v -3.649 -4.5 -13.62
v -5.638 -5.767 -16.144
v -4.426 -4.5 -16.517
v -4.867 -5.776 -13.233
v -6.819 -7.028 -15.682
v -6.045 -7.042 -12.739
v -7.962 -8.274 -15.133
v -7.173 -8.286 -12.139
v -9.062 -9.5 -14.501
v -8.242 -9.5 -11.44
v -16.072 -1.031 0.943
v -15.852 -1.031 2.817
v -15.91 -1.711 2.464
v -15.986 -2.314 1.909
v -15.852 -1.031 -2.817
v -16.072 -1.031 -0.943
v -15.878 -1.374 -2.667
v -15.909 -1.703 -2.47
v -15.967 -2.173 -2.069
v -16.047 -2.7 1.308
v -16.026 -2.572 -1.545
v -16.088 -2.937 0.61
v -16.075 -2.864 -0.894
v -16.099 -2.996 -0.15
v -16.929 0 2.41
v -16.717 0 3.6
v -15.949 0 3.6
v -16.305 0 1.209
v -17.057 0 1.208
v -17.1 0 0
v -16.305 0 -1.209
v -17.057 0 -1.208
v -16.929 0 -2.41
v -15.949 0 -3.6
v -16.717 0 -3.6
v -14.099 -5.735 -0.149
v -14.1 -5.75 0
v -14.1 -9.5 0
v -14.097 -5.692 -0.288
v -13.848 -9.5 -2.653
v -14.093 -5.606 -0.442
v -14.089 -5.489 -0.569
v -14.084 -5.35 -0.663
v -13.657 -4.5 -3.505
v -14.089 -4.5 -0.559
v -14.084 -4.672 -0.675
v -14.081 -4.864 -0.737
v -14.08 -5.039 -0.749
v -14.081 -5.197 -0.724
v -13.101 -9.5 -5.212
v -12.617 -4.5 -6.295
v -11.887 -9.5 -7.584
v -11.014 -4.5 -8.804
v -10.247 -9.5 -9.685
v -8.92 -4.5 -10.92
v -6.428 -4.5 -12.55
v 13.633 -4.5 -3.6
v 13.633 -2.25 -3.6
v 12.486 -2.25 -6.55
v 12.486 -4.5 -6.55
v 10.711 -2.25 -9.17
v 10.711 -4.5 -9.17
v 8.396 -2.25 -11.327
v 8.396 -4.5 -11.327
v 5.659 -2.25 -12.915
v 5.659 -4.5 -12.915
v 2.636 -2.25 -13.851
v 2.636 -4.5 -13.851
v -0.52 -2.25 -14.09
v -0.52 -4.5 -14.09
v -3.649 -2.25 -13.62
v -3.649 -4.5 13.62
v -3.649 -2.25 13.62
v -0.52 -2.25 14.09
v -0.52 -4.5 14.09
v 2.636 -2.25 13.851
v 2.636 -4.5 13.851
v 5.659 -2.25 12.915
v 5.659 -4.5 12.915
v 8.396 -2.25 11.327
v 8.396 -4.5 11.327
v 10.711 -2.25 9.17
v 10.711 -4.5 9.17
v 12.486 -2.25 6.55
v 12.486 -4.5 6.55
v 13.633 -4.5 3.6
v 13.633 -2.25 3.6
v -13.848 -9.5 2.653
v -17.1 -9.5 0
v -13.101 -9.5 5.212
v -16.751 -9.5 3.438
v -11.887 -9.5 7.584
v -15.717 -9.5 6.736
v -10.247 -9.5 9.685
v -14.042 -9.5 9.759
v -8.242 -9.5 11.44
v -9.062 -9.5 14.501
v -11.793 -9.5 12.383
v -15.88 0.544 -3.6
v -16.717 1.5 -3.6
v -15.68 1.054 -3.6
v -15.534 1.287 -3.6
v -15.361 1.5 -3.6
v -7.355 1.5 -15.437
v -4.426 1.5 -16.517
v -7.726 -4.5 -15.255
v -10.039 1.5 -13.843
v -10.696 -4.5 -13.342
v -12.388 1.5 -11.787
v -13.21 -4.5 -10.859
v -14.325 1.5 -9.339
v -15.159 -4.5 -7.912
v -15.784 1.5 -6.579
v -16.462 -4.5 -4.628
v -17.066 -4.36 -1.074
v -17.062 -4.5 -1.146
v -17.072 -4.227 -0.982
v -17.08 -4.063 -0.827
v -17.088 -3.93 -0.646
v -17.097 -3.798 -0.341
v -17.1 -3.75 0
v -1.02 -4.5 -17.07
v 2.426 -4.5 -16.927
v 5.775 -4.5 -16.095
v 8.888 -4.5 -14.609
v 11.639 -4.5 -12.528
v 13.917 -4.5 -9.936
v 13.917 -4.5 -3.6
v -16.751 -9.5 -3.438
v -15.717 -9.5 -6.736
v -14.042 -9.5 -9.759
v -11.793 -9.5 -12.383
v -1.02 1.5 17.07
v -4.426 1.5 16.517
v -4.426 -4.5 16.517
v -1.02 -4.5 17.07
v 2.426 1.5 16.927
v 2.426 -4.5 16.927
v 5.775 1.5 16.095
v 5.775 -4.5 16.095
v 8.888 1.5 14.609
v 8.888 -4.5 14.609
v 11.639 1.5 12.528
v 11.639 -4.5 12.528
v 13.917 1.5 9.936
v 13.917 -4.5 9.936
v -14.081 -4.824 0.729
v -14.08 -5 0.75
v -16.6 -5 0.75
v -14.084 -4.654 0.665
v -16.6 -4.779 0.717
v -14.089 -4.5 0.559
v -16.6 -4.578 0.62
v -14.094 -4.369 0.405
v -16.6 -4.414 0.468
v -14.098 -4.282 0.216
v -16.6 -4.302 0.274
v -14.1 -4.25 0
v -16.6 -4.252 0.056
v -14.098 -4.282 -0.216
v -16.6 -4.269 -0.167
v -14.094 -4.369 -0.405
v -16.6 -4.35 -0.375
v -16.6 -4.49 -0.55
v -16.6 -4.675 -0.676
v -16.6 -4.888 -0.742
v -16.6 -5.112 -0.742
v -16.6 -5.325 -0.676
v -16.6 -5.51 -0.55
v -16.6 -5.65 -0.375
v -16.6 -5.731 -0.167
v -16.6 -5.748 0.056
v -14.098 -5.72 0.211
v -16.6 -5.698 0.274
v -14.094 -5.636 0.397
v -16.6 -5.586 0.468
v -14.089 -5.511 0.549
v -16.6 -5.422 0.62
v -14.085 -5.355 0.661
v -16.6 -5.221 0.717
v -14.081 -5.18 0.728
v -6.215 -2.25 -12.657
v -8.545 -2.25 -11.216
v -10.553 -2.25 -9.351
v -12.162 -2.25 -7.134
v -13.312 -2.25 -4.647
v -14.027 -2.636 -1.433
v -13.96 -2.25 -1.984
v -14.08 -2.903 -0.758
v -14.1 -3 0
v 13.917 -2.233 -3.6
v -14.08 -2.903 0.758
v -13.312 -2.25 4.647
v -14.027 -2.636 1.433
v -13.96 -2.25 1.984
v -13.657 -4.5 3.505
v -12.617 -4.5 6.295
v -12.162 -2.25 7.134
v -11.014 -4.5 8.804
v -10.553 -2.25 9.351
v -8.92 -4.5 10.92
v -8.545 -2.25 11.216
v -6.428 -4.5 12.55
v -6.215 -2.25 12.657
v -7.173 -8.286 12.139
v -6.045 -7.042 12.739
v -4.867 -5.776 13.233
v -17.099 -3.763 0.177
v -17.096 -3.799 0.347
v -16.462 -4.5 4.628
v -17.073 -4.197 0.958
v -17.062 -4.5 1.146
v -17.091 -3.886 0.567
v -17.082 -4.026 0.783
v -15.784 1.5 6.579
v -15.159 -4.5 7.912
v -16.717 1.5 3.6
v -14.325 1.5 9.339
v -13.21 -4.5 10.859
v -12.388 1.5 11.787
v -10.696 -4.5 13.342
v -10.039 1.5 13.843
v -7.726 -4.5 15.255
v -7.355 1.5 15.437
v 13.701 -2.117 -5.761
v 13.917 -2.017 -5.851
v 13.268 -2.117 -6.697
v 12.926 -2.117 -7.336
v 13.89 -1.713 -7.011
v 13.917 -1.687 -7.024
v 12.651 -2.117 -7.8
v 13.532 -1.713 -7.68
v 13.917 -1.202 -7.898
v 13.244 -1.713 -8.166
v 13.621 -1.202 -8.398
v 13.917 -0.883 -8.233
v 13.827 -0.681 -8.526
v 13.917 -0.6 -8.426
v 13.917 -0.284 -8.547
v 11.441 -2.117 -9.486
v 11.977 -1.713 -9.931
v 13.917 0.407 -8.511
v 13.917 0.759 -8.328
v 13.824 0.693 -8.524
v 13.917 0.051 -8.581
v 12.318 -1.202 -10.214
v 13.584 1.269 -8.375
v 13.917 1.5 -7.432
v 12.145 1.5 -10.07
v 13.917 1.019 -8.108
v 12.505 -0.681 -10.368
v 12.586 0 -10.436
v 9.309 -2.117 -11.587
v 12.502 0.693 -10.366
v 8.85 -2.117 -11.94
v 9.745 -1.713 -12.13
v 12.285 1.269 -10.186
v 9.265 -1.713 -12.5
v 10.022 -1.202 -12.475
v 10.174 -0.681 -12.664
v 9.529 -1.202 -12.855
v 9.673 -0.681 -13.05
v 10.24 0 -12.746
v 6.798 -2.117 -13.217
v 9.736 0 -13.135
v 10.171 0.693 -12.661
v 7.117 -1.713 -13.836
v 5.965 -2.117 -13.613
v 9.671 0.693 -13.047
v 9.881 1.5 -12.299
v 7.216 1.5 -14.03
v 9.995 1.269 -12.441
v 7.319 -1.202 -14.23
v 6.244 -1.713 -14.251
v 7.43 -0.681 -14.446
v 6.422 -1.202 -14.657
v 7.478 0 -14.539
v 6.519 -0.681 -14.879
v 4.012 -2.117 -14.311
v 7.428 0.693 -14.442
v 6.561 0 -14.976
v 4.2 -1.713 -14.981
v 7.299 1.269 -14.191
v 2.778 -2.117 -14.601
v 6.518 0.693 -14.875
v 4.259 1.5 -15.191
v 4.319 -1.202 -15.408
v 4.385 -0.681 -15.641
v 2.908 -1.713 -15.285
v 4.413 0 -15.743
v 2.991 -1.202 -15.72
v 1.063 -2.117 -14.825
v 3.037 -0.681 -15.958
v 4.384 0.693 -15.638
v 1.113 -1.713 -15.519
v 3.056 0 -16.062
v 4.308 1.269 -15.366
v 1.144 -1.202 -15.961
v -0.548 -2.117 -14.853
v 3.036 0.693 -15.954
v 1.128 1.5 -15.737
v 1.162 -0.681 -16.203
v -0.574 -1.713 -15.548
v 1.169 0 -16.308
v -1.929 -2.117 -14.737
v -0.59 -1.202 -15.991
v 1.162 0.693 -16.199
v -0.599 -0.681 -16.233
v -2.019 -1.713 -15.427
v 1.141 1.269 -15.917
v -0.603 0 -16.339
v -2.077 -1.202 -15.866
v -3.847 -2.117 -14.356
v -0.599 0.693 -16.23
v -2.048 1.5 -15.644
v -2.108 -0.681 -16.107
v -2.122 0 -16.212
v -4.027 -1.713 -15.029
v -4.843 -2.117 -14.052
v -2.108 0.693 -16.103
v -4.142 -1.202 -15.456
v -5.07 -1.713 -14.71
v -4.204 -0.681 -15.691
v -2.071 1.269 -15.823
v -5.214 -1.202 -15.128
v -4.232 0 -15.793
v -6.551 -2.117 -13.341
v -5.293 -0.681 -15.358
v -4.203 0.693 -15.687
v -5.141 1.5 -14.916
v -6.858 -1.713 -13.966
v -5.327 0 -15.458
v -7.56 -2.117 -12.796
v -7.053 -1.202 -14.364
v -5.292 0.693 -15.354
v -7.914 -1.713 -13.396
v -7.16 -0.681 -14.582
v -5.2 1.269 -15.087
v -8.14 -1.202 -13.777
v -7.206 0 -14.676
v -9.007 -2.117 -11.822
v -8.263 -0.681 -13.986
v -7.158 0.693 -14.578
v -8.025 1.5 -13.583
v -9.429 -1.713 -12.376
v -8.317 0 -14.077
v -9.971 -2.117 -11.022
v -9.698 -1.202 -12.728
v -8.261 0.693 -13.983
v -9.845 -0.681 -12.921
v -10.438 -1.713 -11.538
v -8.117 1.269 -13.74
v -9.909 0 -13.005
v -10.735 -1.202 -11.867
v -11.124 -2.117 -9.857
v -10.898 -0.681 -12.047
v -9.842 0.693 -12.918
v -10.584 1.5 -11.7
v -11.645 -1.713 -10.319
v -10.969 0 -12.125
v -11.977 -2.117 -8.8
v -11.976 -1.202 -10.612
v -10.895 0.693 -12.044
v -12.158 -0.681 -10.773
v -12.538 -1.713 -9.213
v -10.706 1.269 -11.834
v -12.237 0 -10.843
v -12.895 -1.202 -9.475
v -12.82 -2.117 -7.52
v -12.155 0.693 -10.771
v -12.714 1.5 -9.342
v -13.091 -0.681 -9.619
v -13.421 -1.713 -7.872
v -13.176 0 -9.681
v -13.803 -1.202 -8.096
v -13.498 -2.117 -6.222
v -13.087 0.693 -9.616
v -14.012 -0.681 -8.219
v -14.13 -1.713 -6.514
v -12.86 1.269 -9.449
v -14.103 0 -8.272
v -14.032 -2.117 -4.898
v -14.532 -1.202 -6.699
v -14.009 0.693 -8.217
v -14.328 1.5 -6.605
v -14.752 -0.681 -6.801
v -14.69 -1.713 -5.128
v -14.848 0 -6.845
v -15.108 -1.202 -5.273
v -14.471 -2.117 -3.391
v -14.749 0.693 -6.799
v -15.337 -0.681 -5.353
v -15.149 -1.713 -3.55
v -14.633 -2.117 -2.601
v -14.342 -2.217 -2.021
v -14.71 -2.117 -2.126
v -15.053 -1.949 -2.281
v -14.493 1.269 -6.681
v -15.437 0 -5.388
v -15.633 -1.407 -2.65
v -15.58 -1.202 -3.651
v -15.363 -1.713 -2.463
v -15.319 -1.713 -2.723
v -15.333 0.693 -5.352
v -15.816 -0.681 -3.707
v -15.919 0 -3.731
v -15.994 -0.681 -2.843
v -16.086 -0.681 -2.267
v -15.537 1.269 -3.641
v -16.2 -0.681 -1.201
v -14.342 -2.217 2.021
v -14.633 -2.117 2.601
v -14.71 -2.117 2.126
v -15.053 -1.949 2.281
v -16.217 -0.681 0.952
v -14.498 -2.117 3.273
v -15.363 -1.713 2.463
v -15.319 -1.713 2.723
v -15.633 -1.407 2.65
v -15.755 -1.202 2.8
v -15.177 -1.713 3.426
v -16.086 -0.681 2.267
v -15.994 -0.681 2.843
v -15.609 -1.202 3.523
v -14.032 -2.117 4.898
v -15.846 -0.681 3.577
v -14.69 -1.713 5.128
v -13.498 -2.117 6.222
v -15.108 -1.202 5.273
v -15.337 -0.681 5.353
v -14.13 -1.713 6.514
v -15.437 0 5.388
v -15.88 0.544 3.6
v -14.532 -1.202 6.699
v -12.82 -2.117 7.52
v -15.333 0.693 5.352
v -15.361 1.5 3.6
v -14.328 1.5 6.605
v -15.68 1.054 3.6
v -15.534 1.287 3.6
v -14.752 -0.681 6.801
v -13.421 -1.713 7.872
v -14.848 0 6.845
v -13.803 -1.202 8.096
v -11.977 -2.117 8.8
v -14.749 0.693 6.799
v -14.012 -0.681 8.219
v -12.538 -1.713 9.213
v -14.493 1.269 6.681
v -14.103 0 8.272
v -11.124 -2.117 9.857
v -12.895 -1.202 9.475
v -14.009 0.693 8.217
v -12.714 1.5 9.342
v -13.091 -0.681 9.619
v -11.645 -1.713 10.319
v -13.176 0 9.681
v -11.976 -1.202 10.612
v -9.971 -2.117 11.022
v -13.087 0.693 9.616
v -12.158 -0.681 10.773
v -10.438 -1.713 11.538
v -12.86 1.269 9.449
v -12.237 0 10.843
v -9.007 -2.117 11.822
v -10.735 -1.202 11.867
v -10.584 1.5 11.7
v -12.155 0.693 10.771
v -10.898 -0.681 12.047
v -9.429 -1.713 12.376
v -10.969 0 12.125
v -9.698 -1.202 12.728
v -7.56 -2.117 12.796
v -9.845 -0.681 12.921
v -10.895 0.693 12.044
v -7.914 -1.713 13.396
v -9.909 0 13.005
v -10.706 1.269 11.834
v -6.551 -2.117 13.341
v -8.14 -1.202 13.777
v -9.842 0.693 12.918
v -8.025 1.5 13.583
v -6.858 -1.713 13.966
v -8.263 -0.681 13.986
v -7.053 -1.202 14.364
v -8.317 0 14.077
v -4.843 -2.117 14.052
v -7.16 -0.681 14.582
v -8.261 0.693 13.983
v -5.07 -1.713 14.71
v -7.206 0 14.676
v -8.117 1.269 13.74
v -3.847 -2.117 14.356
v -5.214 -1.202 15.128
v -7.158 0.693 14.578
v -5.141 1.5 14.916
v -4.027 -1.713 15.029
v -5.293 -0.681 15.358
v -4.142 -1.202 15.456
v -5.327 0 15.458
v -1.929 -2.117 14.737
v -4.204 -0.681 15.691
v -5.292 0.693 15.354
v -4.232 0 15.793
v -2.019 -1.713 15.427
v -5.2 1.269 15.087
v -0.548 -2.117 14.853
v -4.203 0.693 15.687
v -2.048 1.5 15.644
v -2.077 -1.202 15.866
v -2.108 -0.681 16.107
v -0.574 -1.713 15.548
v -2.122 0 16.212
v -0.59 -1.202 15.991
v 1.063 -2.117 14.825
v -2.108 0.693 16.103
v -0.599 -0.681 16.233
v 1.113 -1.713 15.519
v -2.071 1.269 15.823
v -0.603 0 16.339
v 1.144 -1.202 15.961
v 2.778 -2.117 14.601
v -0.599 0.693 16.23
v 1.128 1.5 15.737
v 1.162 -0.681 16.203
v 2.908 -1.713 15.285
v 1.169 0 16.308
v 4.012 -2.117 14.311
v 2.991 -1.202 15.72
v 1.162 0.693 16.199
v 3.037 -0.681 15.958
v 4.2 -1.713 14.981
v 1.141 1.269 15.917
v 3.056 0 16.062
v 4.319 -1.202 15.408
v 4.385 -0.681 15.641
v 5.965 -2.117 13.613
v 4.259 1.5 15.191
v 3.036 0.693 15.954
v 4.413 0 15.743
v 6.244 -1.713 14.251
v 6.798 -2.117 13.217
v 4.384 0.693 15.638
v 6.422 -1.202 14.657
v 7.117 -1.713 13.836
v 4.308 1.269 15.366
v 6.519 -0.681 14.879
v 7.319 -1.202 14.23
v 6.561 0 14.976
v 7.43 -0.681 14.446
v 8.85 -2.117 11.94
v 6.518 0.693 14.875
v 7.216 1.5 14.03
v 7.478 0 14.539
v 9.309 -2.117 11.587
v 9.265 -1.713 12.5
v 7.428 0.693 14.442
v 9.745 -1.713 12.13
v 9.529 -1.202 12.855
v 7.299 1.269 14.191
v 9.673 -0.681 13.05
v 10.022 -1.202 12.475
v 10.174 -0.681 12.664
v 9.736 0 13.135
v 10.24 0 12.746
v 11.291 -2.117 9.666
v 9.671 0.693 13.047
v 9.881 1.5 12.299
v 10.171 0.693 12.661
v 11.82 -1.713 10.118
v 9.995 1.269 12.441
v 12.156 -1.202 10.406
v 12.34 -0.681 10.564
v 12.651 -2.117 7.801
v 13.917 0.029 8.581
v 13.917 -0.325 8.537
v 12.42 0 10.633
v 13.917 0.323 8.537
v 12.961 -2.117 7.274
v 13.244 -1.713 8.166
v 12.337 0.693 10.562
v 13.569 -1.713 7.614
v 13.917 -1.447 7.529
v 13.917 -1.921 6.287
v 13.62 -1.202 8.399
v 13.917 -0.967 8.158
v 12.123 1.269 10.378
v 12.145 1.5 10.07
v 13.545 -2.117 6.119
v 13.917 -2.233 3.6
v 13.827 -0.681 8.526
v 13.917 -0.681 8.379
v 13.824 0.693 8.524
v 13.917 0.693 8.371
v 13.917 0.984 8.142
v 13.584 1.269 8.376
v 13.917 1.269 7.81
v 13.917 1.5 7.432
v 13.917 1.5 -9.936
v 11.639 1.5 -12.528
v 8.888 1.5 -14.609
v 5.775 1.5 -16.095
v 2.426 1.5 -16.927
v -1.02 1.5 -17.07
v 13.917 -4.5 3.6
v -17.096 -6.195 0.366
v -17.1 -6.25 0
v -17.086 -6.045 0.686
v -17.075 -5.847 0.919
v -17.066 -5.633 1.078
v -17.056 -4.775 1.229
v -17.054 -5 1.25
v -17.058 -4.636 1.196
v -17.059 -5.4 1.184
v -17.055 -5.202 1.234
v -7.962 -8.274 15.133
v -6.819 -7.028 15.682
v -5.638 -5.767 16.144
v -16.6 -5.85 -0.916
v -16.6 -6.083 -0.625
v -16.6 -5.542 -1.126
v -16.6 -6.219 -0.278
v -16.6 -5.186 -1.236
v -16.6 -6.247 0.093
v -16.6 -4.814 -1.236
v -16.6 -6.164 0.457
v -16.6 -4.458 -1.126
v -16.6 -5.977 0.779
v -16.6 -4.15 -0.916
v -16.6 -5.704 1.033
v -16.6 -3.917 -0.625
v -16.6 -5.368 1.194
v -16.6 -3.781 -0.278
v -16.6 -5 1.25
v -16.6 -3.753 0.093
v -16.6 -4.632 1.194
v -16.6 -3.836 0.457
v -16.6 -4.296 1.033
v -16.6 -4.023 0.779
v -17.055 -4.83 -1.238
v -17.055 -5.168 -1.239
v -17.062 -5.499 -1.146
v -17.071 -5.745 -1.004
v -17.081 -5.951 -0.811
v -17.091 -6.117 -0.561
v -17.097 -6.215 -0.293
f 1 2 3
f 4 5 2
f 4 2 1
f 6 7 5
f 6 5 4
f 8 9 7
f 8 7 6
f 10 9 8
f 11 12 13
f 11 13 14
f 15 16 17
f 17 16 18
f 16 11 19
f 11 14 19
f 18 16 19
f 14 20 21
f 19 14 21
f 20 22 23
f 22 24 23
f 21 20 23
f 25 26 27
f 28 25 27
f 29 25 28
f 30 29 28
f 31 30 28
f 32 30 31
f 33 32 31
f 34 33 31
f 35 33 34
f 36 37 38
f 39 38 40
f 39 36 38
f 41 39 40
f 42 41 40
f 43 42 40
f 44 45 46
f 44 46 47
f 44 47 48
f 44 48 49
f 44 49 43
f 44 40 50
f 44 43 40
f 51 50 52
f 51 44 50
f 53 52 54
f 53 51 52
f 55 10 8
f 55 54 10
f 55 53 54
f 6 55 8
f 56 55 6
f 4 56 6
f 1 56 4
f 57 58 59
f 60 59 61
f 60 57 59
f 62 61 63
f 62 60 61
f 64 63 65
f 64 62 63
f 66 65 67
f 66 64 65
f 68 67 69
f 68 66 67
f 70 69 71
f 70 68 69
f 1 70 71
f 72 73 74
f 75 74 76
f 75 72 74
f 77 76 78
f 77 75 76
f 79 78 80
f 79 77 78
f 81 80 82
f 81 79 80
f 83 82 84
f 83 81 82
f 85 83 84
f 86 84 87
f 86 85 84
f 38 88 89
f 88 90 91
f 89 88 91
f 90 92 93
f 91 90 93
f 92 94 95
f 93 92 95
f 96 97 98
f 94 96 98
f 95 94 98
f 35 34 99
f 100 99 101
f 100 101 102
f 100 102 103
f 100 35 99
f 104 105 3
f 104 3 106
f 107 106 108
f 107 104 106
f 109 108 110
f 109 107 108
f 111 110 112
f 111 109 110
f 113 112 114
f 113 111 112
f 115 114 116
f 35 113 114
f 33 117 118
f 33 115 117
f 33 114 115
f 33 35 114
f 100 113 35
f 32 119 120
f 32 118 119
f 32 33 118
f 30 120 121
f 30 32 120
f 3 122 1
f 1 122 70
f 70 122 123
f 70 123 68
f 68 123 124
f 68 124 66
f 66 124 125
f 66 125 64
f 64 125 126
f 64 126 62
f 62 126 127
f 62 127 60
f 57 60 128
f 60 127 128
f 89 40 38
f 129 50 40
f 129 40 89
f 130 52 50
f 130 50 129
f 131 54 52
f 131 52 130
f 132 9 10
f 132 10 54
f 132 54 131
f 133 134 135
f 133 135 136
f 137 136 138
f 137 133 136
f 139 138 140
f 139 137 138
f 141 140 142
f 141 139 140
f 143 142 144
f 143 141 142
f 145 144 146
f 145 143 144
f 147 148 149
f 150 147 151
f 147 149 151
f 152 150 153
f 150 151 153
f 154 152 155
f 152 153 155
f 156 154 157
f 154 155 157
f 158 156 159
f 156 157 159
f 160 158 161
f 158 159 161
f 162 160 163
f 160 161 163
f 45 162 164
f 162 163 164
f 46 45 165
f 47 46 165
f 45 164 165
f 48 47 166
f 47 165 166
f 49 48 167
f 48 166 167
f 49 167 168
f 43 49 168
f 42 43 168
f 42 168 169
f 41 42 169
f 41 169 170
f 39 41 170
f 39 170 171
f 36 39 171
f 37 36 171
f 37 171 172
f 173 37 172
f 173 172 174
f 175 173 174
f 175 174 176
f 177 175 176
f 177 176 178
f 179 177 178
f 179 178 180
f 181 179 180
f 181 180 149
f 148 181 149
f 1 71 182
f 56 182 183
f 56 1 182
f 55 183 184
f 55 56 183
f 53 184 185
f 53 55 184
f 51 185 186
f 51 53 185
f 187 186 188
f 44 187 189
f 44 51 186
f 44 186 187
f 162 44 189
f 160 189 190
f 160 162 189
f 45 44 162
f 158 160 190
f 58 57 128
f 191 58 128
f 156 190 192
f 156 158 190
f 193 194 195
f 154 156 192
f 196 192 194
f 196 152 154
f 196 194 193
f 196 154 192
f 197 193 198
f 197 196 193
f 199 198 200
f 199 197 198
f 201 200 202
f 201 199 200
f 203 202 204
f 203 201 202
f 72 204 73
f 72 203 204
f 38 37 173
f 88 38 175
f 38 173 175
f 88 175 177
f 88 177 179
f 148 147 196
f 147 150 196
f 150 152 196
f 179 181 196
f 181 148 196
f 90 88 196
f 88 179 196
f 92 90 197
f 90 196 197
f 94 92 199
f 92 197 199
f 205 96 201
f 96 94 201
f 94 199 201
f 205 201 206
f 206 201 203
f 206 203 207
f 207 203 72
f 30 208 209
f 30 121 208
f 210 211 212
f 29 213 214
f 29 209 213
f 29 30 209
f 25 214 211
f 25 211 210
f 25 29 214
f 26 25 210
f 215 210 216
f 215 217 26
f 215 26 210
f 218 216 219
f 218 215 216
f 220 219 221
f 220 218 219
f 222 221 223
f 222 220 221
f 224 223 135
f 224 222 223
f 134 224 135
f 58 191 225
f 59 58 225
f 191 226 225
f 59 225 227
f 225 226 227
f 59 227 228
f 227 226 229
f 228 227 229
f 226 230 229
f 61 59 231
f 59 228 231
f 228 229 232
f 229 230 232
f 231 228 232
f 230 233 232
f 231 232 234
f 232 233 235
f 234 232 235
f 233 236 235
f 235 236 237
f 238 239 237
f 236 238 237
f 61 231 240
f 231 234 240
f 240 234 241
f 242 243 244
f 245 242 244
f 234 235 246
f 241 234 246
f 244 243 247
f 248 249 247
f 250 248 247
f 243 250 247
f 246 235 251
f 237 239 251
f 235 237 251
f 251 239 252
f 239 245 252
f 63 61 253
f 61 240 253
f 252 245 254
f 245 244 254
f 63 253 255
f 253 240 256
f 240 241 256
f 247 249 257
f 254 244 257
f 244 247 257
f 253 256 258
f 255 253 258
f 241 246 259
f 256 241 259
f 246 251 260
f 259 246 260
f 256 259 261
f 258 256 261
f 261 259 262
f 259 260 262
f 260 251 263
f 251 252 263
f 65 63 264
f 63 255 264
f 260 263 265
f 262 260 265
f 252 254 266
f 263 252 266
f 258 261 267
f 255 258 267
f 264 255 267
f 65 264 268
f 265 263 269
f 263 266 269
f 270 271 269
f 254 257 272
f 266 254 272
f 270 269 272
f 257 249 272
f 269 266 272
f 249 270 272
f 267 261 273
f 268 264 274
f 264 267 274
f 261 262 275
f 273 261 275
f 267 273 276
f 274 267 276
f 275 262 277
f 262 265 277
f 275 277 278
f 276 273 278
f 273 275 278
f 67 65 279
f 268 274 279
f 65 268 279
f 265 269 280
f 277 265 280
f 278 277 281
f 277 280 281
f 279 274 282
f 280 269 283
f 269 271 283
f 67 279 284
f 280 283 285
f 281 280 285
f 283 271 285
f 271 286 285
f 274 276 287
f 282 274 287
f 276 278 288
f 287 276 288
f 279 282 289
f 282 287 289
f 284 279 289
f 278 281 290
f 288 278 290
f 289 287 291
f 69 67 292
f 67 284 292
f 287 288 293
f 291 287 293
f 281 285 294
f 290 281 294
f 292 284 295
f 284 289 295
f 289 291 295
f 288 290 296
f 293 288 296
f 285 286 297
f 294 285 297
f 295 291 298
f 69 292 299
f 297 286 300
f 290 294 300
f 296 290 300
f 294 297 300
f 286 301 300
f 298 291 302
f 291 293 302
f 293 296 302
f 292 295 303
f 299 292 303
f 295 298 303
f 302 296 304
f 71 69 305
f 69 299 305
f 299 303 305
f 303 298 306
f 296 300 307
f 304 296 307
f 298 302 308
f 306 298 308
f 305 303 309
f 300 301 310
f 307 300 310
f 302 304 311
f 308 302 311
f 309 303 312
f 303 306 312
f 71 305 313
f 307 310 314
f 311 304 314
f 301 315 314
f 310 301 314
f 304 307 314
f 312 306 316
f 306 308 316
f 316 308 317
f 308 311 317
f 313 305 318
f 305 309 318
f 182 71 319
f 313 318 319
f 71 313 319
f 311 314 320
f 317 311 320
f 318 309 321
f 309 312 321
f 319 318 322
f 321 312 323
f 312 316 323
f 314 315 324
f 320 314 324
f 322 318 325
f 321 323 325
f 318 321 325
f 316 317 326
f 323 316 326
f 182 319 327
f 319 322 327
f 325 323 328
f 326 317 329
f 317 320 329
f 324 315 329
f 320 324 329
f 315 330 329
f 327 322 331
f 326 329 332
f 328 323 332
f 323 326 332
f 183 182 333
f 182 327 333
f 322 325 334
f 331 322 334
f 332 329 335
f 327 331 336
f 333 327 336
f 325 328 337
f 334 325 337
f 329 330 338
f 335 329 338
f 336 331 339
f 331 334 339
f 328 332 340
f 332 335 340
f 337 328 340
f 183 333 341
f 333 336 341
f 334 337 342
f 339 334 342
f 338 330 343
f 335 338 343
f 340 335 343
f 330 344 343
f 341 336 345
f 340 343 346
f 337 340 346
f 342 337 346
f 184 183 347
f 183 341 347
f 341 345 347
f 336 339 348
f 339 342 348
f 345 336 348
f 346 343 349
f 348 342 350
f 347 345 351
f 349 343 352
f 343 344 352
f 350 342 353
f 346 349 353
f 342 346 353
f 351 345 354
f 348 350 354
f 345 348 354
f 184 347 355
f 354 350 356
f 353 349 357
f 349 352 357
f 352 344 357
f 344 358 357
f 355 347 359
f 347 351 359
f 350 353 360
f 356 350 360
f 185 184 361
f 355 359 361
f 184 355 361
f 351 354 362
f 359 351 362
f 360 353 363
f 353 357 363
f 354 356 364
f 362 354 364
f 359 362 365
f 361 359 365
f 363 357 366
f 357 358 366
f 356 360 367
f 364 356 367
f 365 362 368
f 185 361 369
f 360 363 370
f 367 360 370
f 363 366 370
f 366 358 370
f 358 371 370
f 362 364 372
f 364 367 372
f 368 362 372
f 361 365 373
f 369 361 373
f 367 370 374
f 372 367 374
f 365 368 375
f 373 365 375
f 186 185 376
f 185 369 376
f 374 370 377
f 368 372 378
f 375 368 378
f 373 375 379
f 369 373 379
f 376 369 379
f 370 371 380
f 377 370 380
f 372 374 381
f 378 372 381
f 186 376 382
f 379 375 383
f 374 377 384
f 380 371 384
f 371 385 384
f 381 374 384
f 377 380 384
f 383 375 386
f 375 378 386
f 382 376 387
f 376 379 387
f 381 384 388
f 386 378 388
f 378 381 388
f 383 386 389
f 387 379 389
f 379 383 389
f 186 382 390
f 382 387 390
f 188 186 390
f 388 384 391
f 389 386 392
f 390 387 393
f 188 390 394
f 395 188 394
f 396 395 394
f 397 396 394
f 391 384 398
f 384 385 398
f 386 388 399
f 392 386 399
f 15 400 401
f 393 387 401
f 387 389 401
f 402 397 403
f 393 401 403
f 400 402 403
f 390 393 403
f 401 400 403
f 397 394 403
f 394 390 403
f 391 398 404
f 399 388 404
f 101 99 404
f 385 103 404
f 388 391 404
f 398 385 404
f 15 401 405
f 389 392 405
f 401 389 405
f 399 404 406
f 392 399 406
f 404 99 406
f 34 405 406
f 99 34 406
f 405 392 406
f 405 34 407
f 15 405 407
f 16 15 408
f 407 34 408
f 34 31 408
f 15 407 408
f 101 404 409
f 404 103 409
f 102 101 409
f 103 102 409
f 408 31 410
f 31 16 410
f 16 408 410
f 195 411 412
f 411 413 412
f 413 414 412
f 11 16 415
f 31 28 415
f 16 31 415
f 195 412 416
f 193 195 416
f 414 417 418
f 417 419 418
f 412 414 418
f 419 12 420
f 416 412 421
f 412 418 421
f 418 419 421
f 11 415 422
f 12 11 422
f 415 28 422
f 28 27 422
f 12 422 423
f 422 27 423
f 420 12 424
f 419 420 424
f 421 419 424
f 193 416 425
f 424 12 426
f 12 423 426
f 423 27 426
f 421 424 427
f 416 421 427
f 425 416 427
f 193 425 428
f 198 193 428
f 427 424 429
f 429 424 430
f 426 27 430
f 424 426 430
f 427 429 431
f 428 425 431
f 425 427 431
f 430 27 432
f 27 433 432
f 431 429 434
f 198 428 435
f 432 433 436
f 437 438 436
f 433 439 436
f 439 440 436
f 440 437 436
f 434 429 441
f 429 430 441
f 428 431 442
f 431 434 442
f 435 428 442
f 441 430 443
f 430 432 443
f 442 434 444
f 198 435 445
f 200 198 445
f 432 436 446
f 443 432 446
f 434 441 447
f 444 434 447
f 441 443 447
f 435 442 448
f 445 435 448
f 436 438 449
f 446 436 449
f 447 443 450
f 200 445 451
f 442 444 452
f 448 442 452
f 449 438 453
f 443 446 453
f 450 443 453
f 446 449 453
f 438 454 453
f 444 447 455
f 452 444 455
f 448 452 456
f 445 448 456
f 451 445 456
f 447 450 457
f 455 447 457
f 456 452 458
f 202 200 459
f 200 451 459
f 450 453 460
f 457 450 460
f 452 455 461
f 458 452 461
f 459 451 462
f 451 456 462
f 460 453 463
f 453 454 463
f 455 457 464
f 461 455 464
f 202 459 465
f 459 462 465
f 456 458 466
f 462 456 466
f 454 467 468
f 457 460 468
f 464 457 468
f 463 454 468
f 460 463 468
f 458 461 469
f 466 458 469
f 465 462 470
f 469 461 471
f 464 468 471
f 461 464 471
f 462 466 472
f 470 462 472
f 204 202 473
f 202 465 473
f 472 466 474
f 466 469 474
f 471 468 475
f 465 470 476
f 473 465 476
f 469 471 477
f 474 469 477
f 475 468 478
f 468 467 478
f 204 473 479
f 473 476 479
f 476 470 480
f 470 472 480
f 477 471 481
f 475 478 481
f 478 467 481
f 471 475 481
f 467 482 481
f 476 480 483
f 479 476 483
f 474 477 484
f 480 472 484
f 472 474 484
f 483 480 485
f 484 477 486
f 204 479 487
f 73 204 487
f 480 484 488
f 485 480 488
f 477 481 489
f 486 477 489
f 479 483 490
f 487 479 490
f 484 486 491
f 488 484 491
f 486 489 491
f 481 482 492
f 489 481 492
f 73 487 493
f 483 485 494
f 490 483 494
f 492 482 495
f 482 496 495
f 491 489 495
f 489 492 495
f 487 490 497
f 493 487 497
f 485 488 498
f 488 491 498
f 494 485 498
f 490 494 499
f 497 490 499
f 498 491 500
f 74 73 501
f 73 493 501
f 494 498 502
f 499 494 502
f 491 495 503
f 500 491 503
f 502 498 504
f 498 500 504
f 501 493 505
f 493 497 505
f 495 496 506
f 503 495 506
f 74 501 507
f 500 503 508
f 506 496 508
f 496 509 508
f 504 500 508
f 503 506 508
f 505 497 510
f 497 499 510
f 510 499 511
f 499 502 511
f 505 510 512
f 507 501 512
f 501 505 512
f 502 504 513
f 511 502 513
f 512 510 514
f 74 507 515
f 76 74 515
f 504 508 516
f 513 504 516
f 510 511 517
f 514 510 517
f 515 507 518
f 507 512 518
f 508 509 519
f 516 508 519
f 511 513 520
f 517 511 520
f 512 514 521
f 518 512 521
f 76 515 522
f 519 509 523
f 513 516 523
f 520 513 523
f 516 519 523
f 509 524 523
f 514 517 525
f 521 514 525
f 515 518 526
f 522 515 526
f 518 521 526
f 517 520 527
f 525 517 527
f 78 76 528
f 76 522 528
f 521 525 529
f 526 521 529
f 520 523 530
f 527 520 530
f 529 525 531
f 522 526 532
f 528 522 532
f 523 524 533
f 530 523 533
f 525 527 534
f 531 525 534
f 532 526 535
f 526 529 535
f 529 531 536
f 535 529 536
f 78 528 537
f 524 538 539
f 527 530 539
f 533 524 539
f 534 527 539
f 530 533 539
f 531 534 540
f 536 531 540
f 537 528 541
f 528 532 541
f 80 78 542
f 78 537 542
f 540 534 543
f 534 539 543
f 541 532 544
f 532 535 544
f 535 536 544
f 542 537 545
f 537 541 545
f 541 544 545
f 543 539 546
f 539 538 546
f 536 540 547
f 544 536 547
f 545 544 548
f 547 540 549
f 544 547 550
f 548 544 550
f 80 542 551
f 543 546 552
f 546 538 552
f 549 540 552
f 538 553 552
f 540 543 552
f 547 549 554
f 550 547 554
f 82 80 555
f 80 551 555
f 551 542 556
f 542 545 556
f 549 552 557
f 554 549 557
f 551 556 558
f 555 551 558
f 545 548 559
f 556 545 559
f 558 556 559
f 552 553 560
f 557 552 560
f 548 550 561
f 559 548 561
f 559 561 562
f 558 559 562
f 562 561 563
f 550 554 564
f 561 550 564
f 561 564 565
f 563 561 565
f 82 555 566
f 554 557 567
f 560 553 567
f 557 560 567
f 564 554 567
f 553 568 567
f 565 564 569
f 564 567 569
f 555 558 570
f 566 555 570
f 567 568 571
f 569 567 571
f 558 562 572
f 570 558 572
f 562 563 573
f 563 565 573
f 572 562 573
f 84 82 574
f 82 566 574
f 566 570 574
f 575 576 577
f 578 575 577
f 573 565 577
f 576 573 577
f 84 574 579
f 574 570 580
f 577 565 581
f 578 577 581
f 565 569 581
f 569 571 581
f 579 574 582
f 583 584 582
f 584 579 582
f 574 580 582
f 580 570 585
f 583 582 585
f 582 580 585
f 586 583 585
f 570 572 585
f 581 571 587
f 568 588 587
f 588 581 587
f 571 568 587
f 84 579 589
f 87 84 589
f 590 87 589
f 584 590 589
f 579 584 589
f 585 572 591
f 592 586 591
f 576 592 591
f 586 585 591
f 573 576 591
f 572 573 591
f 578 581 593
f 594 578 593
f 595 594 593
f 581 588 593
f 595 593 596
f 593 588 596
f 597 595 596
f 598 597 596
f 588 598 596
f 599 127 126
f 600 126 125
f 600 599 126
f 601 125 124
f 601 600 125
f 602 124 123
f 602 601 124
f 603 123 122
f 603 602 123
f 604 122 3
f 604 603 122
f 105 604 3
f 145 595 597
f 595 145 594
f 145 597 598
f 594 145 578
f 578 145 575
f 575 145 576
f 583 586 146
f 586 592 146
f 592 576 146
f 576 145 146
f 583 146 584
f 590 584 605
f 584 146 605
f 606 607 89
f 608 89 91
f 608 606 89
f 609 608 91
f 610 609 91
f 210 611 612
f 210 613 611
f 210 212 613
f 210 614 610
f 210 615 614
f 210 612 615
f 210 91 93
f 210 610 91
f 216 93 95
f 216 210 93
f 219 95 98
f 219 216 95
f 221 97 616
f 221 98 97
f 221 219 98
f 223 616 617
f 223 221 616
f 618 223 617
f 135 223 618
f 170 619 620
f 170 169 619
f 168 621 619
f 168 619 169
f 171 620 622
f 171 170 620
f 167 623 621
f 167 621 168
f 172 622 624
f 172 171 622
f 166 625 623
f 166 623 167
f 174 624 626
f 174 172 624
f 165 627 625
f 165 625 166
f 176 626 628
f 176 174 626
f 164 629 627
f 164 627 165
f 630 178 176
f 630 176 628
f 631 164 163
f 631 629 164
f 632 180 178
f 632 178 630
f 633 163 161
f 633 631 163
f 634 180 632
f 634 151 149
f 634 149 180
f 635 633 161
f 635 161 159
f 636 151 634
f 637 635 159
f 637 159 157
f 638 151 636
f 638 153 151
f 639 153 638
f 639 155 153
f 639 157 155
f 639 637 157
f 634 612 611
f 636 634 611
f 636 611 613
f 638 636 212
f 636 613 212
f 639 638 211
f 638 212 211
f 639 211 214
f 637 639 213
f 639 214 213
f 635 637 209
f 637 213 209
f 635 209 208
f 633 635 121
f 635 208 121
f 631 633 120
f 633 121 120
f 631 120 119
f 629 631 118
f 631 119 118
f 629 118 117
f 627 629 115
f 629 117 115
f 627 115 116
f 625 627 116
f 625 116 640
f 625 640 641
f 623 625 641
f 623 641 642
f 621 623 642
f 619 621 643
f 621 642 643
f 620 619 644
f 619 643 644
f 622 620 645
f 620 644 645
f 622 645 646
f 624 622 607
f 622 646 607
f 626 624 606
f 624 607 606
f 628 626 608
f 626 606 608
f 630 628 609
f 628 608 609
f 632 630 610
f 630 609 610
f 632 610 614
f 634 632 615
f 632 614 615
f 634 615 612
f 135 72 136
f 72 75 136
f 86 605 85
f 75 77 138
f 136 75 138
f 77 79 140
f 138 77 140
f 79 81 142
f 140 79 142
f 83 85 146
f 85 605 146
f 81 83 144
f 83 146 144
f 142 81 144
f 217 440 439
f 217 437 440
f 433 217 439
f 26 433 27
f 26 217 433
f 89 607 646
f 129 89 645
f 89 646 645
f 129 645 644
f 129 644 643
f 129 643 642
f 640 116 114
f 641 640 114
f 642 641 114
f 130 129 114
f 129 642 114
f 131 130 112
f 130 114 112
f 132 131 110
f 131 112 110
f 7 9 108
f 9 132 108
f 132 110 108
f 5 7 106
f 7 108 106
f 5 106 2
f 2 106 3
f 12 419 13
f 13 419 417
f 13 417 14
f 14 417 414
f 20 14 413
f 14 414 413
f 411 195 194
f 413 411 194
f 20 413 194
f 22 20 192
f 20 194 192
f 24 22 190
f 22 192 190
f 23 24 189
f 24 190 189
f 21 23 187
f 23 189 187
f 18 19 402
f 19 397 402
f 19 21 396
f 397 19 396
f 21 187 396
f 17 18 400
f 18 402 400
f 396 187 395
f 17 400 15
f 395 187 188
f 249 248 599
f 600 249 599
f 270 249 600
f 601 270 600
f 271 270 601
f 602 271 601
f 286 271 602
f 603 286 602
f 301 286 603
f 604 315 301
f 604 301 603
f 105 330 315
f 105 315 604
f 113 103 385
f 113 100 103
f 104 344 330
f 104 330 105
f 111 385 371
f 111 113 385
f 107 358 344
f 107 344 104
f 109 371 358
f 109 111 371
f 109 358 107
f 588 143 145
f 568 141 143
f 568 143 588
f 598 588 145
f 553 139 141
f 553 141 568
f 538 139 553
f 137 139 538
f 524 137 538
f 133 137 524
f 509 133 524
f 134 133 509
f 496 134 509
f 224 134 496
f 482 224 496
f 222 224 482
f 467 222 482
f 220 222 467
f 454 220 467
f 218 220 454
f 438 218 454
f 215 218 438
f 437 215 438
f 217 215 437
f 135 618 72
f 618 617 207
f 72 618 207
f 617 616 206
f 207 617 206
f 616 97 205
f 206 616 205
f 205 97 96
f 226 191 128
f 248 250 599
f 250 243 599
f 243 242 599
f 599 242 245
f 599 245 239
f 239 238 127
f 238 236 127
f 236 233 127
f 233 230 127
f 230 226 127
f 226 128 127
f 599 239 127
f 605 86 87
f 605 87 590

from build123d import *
from build123d.topology import SkipClean

# Parameters (mm, degrees)
CROQUIS1_R                 = 17.1
CROQUIS1_R_2               = 14.1
SALIENTE_EXTRUIR1_DEPTH    = 4.5
CORTAR_EXTRUIR1_REACH      = 27.803
CROQUIS2_W                 = 15.420651877
CROQUIS2_H                 = 7.2
CROQUIS54_W                = 3
CROQUIS54_H                = 19
REVOLUCI_N1_ANGLE          = 150
CORTAR_BARRER2_PROFILE_R   = 2.25
CHAFL_N3_SIZE              = 5
CORTAR_EXTRUIR2_REACH      = 27.982
CORTAR_EXTRUIR2_END_RADIUS = 16.1
CROQUIS61_R                = 3
CORTAR_EXTRUIR3_DEPTH      = 26.982109266
CORTAR_EXTRUIR3_DEPTH_BACK = 26.982109266
CORTAR_EXTRUIR4_REACH      = 41.067
CORTAR_EXTRUIR4_END_RADIUS = 14.1
CROQUIS63_R                = 0.75
CROQUIS64_R                = 1.25
CORTAR_EXTRUIR5_DEPTH      = 0.5
CORTAR_EXTRUIR6_START      = -11
CROQUIS65_W                = 2.8
CROQUIS65_H                = 19.872981168
CORTAR_EXTRUIR6_DEPTH      = 11


with BuildPart() as part:
    # Croquis1 → Saliente-Extruir1 (new, symmetric)
    with BuildSketch(Plane(origin=(0, 0, 0), x_dir=(1, 0, 0), z_dir=(0, 1, 0))):
        with Locations(Location((0, 0, 0), (0, 0, 270))):
            Circle(CROQUIS1_R)
        with Locations(Location((0, 0, 0), (0, 0, 270))):
            Circle(CROQUIS1_R_2, mode=Mode.SUBTRACT)
    extrude(amount=SALIENTE_EXTRUIR1_DEPTH, both=True)

    # Croquis2 → Cortar-Extruir1 (cut, up to next)
    with BuildSketch(Plane(origin=(0, 4.5, 0), x_dir=(1, 0, 0), z_dir=(0, 1, 0)), mode=Mode.PRIVATE) as cortar_extruir1_sk1:
        with Locations((15.870282115, 0)):
            Rectangle(CROQUIS2_W, CROQUIS2_H)
    cortar_extruir1_tool1 = extrude(cortar_extruir1_sk1.sketch, amount=-CORTAR_EXTRUIR1_REACH, mode=Mode.PRIVATE) & part.part
    add(cortar_extruir1_tool1.solids().sort_by_distance((15.870282, 4.5, 0))[0], mode=Mode.SUBTRACT)

    # Croquis54 → Revolución1 (revolve, symmetric)
    with SkipClean():  # the faces are left unmerged after this step: merging them gives an invalid solid
        with BuildSketch(Plane.XY) as revoluci_n1_sk:
            with Locations((-15.6, 0)):
                Rectangle(CROQUIS54_W, CROQUIS54_H)
        revolve(axis=Axis((0, -13.582020258, 0), (0, 1, 0)), revolution_arc=REVOLUCI_N1_ANGLE / 2)
        revolve(revoluci_n1_sk.sketch, axis=Axis((0, -13.582020258, 0), (0, -1, 0)), revolution_arc=REVOLUCI_N1_ANGLE / 2)
    add(part.part.scale(1), mode=Mode.REPLACE)  # the faces are merged on a copy

    # Cortar-Barrer2: sweep along a path in Croquis12
    with BuildLine(Plane(origin=(0, 0, 0), x_dir=(1, 0, 0), z_dir=(0, 1, 0))) as cortar_barrer2_path:
        CenterArc((0, 0), 14.1, 0, 360)
    # Cortar-Barrer2 profile (on start of the path) → Cortar-Barrer2 (sweep, cut)
    with BuildSketch(Plane(origin=(14.1, 0, 0), x_dir=(-1, 0, 0), z_dir=(0, 0, -1))):
        Circle(CORTAR_BARRER2_PROFILE_R)
    sweep(path=cortar_barrer2_path.line, mode=Mode.SUBTRACT)

    # Chaflán3
    chafl_n3_edges = [part.edges().sort_by_distance(p)[0] for p in [
        (-4.037577104, -9.5, -15.06844289),
        (-4.037577104, 9.5, -15.06844289),
        (-4.037577104, -9.5, 15.06844289),
        (-4.037577104, 9.5, 15.06844289),
    ]]
    chamfer(chafl_n3_edges, length=CHAFL_N3_SIZE - 0.0001)  # a hair under: the kernel refuses the full size

    # Cortar-Extruir2: up to this cylinder (the profile starts inside it)
    cortar_extruir2_end = Plane(origin=(0, 0, 0), z_dir=(0, -1, 0)) * Cylinder(CORTAR_EXTRUIR2_END_RADIUS, 89.164, mode=Mode.PRIVATE)
    # Croquis61 → Cortar-Extruir2 (cut, up to the surface)
    with BuildSketch(Plane(origin=(0, 0, 0), x_dir=(0, 0, -1), z_dir=(1, 0, 0)), mode=Mode.PRIVATE) as cortar_extruir2_sk1:
        Circle(CROQUIS61_R)
    cortar_extruir2_tool1 = extrude(cortar_extruir2_sk1.sketch, amount=-CORTAR_EXTRUIR2_REACH, mode=Mode.PRIVATE) & cortar_extruir2_end
    add(cortar_extruir2_tool1.solids().sort_by_distance((0, 0, 0))[0], mode=Mode.SUBTRACT)

    # Croquis62 → Cortar-Extruir3 (cut, two sides: drawn at the far end of the back side and taken through both)
    with BuildSketch(Plane(origin=(0, 0, 0), x_dir=(0, 0, -1), z_dir=(1, 0, 0)).offset(-CORTAR_EXTRUIR3_DEPTH_BACK)):
        Polygon((-3.6, 1.5), (-3.6, 0), (3.6, 0), (3.6, 1.5), (19.353781031, 1.5), (19.353781031, 12.340609049), (-20.692074401, 12.340609049), (-20.692074401, 1.5), align=None)
    extrude(amount=CORTAR_EXTRUIR3_DEPTH + CORTAR_EXTRUIR3_DEPTH_BACK, mode=Mode.SUBTRACT)

    # Cortar-Extruir4: up to this cylinder (the profile starts outside it)
    with SkipClean():  # the faces are left unmerged after this step: merging them gives an invalid solid
        cortar_extruir4_end = Plane(origin=(0, -5, 0), z_dir=(0, -1, 0)) * Cylinder(CORTAR_EXTRUIR4_END_RADIUS, 111.334, mode=Mode.PRIVATE)
        # Croquis63 → Cortar-Extruir4 (cut, up to the surface)
        with BuildSketch(Plane(origin=(-17.1, 0, 0), x_dir=(0, -1, 0), z_dir=(-1, 0, 0)), mode=Mode.PRIVATE) as cortar_extruir4_sk1:
            with Locations(Location((5, 0, 0), (0, 0, 90))):
                Circle(CROQUIS63_R)
        cortar_extruir4_tool1 = extrude(cortar_extruir4_sk1.sketch, amount=-CORTAR_EXTRUIR4_REACH, mode=Mode.PRIVATE) - cortar_extruir4_end
        add(cortar_extruir4_tool1.solids().sort_by_distance((-17.1, -5, 0))[0], mode=Mode.SUBTRACT)

    # Croquis64 → Cortar-Extruir5 (cut)
    with SkipClean():  # the faces are left unmerged after this step: merging them gives an invalid solid
        with BuildSketch(Plane(origin=(-17.1, 0, 0), x_dir=(0, -1, 0), z_dir=(-1, 0, 0))):
            with Locations(Location((5, 0, 0), (0, 0, 90))):
                Circle(CROQUIS64_R)
        extrude(amount=-CORTAR_EXTRUIR5_DEPTH, mode=Mode.SUBTRACT)

    # Croquis65 → Cortar-Extruir6 (cut)
    with SkipClean():  # the faces are left unmerged after this step: merging them gives an invalid solid
        with BuildSketch(Plane(origin=(0, 1.5, 0), x_dir=(1, 0, 0), z_dir=(0, 1, 0)).offset(CORTAR_EXTRUIR6_START)):
            with Locations((15.316758059, 0)):
                Rectangle(CROQUIS65_W, CROQUIS65_H)
        extrude(amount=CORTAR_EXTRUIR6_DEPTH, mode=Mode.SUBTRACT)


solid = part.part
